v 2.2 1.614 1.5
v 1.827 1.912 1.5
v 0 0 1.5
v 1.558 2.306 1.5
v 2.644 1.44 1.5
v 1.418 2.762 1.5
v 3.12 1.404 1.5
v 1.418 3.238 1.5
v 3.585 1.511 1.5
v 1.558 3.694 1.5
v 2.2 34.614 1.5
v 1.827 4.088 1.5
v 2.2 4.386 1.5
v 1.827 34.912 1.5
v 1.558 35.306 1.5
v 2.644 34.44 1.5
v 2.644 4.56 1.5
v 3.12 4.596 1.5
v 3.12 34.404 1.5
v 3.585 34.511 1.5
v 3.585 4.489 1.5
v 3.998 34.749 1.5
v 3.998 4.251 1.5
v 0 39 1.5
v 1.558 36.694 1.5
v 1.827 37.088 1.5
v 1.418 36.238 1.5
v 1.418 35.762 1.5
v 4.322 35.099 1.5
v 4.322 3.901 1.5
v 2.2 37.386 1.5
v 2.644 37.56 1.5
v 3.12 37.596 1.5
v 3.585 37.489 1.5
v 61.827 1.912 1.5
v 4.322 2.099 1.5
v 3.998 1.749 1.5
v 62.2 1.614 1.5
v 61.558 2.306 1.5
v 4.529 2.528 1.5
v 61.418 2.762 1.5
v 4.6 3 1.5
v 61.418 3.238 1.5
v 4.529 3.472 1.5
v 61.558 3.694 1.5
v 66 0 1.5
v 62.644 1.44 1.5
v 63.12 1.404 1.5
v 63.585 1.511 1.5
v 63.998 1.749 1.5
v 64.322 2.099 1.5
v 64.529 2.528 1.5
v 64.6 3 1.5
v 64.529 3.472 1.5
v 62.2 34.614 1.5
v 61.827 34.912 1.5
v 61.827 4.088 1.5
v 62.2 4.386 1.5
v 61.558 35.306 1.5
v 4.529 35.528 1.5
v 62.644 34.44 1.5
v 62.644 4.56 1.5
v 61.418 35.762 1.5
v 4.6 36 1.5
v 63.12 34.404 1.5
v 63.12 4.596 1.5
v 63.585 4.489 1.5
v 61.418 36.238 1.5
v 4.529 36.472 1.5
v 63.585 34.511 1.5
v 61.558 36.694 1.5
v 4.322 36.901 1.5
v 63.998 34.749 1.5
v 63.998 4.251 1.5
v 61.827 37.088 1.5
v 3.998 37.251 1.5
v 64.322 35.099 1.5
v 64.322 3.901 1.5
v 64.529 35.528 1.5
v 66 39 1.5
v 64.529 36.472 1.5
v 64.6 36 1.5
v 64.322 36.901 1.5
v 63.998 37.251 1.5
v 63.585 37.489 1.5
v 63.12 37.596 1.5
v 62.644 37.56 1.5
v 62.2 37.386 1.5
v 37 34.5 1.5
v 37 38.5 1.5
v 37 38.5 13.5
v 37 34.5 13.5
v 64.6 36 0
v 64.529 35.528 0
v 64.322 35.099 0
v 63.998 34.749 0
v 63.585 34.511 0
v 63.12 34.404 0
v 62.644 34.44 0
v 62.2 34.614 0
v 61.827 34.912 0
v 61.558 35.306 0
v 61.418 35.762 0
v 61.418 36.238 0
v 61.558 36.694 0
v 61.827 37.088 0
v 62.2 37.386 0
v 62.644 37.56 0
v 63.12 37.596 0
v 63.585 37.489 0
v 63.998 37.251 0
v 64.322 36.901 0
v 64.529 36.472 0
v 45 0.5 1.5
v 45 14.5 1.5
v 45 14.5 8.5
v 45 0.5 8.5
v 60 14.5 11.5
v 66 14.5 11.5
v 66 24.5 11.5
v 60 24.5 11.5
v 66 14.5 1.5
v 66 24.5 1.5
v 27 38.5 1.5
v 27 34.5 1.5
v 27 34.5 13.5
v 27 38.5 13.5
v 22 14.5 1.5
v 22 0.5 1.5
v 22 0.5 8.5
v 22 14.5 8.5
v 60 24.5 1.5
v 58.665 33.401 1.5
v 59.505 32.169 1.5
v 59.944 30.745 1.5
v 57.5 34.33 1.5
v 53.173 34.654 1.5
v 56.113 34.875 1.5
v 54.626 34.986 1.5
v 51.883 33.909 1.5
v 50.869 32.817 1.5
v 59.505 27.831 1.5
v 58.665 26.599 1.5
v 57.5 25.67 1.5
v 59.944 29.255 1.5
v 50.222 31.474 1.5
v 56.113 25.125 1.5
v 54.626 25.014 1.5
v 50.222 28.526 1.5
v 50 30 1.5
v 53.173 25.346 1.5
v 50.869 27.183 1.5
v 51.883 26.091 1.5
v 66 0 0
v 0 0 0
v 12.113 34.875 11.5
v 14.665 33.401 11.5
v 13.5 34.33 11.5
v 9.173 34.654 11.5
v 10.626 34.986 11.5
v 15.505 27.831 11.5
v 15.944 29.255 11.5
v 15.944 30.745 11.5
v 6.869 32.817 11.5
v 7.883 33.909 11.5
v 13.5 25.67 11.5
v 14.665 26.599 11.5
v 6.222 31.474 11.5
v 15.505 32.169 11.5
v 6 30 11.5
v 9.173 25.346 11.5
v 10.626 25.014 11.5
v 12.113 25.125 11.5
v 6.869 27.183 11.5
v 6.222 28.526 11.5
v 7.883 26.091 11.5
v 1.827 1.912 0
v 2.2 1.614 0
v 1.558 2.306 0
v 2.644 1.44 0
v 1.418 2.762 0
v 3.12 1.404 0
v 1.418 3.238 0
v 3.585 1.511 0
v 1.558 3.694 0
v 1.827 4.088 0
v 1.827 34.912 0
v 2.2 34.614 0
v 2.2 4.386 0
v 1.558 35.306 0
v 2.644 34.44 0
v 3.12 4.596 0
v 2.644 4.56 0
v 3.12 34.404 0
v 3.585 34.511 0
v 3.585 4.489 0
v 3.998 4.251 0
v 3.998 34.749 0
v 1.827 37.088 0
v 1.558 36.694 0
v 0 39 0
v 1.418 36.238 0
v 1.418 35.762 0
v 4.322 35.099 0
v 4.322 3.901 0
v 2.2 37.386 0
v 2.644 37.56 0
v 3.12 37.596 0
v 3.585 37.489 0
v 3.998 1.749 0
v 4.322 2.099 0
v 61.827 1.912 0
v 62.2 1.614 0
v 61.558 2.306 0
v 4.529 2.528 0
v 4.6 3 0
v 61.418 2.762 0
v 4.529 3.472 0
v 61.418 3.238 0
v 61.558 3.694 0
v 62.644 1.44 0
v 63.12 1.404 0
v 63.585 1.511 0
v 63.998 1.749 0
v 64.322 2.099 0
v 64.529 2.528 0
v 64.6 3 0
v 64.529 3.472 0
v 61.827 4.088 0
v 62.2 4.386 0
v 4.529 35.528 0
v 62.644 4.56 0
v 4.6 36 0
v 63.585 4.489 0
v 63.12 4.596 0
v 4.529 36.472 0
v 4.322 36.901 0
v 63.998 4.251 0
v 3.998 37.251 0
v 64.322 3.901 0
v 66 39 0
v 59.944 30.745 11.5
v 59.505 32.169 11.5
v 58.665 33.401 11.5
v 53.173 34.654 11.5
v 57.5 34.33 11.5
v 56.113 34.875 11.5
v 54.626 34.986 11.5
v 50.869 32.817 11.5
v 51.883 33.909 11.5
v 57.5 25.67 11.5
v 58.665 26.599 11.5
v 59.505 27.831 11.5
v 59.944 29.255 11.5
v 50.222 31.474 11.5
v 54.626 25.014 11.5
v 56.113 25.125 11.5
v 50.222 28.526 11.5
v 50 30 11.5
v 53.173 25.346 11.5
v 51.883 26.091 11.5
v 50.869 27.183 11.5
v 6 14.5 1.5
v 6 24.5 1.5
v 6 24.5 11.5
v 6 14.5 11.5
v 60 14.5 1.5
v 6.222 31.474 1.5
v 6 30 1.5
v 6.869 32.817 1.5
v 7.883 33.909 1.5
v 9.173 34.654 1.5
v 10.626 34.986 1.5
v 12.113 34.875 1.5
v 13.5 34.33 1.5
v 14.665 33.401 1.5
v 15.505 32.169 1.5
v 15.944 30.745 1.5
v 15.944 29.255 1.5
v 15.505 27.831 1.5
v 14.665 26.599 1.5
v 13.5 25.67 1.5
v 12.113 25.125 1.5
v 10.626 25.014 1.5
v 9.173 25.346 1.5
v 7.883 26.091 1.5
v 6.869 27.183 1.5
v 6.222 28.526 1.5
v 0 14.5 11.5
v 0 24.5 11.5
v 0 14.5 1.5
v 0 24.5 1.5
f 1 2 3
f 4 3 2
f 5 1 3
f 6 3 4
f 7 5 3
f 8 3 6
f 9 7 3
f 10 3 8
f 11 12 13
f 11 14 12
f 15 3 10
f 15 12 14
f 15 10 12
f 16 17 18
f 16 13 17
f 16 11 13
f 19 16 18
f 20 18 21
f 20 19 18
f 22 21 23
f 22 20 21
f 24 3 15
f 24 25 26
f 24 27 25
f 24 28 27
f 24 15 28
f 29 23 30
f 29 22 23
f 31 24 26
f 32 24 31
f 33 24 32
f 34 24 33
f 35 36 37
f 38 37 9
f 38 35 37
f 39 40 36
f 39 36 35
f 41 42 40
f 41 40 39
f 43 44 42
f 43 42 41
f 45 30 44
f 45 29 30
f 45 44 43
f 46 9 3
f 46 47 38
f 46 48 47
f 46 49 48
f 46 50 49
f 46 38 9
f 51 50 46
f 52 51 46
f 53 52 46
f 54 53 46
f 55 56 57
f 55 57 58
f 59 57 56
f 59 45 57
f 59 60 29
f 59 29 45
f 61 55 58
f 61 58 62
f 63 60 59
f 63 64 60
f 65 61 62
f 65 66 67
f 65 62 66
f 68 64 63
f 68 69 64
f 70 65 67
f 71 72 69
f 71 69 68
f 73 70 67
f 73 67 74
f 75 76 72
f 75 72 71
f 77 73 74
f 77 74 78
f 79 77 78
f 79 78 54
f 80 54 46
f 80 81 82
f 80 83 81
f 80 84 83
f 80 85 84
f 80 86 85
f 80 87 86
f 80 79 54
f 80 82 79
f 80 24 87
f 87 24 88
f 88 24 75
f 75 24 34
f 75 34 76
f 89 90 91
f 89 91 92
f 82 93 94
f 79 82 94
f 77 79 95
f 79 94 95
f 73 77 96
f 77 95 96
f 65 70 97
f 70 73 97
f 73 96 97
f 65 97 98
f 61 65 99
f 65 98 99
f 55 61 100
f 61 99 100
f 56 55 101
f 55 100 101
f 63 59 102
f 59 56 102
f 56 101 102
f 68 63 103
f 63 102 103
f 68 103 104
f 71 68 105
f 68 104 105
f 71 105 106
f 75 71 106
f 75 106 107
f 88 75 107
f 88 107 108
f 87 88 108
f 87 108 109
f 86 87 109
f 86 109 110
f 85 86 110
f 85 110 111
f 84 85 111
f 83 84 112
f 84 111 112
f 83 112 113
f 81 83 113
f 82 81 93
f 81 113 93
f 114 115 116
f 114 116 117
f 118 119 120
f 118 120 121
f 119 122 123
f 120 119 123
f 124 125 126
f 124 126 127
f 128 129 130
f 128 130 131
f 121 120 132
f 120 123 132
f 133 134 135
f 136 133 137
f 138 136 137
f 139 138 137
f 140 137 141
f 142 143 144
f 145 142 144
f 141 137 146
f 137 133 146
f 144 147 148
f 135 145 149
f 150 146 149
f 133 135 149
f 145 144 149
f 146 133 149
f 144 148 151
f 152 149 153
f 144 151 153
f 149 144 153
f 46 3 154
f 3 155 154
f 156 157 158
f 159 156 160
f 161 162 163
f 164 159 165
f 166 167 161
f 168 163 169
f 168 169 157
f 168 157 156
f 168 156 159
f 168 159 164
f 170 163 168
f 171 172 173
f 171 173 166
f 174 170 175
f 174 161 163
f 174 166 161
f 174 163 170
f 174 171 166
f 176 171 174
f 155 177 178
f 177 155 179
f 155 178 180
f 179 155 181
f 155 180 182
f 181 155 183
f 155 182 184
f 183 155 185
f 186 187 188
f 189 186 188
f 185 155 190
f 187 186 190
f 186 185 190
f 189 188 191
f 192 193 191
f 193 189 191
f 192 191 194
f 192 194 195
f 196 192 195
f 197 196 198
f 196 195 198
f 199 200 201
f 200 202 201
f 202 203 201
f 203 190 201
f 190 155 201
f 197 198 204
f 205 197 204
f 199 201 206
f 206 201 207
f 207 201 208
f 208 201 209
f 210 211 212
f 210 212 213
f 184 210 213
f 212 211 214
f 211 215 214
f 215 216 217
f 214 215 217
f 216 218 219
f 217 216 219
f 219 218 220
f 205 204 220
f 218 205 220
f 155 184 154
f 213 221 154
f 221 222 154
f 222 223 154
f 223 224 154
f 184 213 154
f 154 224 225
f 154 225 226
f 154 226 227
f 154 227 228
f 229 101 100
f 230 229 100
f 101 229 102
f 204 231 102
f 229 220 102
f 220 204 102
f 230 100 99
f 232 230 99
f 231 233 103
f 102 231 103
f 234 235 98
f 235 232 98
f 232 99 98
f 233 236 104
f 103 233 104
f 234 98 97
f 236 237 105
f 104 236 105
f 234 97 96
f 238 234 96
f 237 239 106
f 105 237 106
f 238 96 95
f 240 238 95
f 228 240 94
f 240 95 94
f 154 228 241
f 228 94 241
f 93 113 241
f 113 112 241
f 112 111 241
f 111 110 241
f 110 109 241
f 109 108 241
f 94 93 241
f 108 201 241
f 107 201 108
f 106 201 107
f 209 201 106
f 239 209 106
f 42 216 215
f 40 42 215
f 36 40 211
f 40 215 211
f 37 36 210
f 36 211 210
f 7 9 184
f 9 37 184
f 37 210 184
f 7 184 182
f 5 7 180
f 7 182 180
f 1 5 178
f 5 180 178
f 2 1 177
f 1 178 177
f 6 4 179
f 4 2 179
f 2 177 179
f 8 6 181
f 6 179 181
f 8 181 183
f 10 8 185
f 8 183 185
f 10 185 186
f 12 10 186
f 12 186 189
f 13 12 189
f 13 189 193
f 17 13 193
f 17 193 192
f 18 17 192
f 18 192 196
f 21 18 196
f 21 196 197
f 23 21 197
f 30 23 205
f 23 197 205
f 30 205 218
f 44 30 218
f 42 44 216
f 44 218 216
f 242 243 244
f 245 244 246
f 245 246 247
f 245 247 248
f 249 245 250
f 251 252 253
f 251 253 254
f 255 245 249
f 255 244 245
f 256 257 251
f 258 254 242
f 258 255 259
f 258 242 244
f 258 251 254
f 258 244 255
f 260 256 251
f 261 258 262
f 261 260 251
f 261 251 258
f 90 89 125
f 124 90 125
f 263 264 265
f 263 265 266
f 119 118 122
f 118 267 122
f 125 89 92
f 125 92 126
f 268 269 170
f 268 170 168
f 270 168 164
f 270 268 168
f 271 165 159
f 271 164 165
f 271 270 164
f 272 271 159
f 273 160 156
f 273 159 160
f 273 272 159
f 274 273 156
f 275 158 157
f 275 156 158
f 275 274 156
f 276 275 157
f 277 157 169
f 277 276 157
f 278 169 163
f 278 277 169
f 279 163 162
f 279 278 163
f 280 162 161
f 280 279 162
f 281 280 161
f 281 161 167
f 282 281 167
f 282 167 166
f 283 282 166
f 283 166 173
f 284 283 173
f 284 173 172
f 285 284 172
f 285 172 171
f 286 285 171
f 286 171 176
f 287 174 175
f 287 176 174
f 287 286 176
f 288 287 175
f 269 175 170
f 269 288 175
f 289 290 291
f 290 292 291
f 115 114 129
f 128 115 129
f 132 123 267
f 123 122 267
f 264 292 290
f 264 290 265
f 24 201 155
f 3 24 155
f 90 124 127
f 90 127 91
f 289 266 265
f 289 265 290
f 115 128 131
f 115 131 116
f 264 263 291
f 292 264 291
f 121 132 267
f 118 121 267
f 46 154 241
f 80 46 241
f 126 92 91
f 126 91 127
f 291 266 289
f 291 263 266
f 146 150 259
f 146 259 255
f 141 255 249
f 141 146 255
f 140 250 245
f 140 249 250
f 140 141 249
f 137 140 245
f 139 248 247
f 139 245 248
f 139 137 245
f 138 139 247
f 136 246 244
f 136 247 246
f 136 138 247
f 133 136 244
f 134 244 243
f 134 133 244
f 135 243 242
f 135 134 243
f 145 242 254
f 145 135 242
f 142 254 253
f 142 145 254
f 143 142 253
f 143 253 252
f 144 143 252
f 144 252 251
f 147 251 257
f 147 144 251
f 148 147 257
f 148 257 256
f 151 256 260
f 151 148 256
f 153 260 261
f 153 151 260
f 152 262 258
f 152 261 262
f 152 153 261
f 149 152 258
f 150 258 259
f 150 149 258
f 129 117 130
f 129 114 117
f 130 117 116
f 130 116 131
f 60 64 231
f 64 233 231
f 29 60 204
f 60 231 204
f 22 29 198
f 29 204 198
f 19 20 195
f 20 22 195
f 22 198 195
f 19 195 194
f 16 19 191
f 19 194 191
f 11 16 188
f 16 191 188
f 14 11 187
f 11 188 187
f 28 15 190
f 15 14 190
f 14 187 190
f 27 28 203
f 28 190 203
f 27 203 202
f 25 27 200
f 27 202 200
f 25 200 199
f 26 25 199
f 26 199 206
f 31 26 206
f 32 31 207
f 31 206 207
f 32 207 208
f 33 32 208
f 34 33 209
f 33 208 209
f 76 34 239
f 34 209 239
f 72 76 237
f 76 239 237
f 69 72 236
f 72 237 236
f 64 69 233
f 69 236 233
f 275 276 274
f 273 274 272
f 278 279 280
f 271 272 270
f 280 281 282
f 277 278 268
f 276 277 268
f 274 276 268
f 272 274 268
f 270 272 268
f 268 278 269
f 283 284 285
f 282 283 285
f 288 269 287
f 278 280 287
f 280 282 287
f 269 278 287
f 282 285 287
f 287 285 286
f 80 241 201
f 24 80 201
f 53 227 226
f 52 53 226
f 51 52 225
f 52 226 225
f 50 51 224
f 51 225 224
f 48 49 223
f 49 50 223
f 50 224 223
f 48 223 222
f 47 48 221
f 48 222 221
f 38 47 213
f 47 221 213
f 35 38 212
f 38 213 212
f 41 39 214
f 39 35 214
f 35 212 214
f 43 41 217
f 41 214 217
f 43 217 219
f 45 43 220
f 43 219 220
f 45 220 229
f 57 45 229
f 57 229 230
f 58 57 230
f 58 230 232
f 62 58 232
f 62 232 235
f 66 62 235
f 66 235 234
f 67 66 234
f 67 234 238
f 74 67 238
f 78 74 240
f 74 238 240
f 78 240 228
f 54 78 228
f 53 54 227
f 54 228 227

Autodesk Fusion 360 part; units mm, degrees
sketch "草图1" plane through (0, 0, 0) normal (0, 0, 1) x (1, 0, 0)
  line L0 (0, 0) -> (66, 0)
  line L1 (66, 0) -> (66, 39)
  line L2 (66, 39) -> (0, 39)
  line L3 (0, 39) -> (0, 0)
  line L4 (-18.8664, 19.5) -> (92.9344, 19.5)
  line L5 (33, 51.4326) -> (33, -27.2938)
  circle A0 centre (3, 36) radius 1.6
  circle A1 centre (63, 36) radius 1.6
  circle A2 centre (3, 3) radius 1.6
  circle A3 centre (63, 3) radius 1.6
  dimension "d1" = 66
  dimension "d2" = 39
  dimension "d3" = 3.2
  dimension "d4" = 60
  dimension "d5" = 33
extrude "拉伸1" add sketch "草图1" along normal blind 1.5 makes body 1
sketch "草图2" plane through (0, 0, 1.5) normal (0, 0, 1) x (-1, 0, 0)
  circle A0 centre (-3, -36) radius 1.6
  circle A1 centre (-63, -3) radius 1.6
  circle A2 centre (-3, -3) radius 1.6
  circle A3 centre (-63, -36) radius 1.6
  line L0 (0, -39) -> (0, 0)
  line L1 (0, 0) -> (-66, 0)
  line L2 (-66, 0) -> (-66, -39)
  line L3 (-66, -39) -> (0, -39)
  line L4 (0, -24.5) -> (-6, -24.5)
  line L5 (-6, -24.5) -> (-6, -14.5)
  line L6 (-6, -14.5) -> (0, -14.5)
  line L7 (0, -14.5) -> (0, -24.5)
  line L8 (-66, -24.5) -> (-60, -24.5)
  line L9 (-60, -24.5) -> (-60, -14.5)
  line L10 (-60, -14.5) -> (-66, -14.5)
  line L11 (-66, -14.5) -> (-66, -24.5)
  dimension "d8" = 10
  dimension "d9" = 10
  dimension "d10" = 6
  dimension "d11" = 6
  dimension "d12" = 14.5
  dimension "d13" = 14.5
extrude "拉伸2" add sketch "草图2" along normal blind 10 separate body contours L0 L4 L5 L6 L7 | L2 L8 L9 L10 L11 makes body 2 at (6, 21.1667, 4.8333) makes body 3 at (66, 17.8333, 4.8333)
sketch "草图3" plane through (0, 0, 1.5) normal (0, 0, 1) x (-1, 0, 0)
  circle A0 centre (-3, -36) radius 1.6
  circle A1 centre (-63, -3) radius 1.6
  circle A2 centre (-3, -3) radius 1.6
  circle A3 centre (-63, -36) radius 1.6
  line L0 (0, -39) -> (0, 0)
  line L1 (0, 0) -> (-66, 0)
  line L2 (-66, 0) -> (-66, -39)
  line L3 (-66, -39) -> (0, -39)
  circle A4 centre (-11, -30) radius 5
  circle A5 centre (-55, -30) radius 5
  dimension "d16" = 10
  dimension "d17" = 10
  dimension "d18" = 11
  dimension "d19" = 11
  dimension "d20" = 9
  dimension "d21" = 9
extrude "拉伸3" add sketch "草图3" along normal blind 10 separate body contours A4 | A5 makes body 4 at (50.0062, 30.2492, 8.1667) makes body 5 at (6.0062, 30.2492, 8.1667)
sketch "草图4" plane through (0, 0, 1.5) normal (0, 0, 1) x (-1, 0, 0)
  circle A0 centre (-3, -36) radius 1.6
  circle A1 centre (-63, -3) radius 1.6
  circle A2 centre (-3, -3) radius 1.6
  circle A3 centre (-63, -36) radius 1.6
  line L0 (0, -39) -> (0, 0)
  line L1 (0, 0) -> (-66, 0)
  line L2 (-66, 0) -> (-66, -39)
  line L3 (-66, -39) -> (0, -39)
  line L4 (-27, -38.5) -> (-37, -38.5)
  line L5 (-37, -38.5) -> (-37, -34.5)
  line L6 (-37, -34.5) -> (-27, -34.5)
  line L7 (-27, -34.5) -> (-27, -38.5)
  dimension "d24" = 10
  dimension "d25" = 4
  dimension "d26" = 27
  dimension "d27" = 0.5
extrude "拉伸4" add sketch "草图4" along normal blind 12 separate body contours L4 L5 L6 L7 makes body 6
sketch "草图5" plane through (0, 0, 1.5) normal (0, 0, 1) x (-1, 0, 0)
  circle A0 centre (-3, -36) radius 1.6
  circle A1 centre (-63, -3) radius 1.6
  circle A2 centre (-3, -3) radius 1.6
  circle A3 centre (-63, -36) radius 1.6
  line L0 (0, -39) -> (0, 0)
  line L1 (0, 0) -> (-66, 0)
  line L2 (-66, 0) -> (-66, -39)
  line L3 (-66, -39) -> (0, -39)
  line L4 (-22, -14.5) -> (-45, -14.5)
  line L5 (-45, -14.5) -> (-45, -0.5)
  line L6 (-45, -0.5) -> (-22, -0.5)
  line L7 (-22, -0.5) -> (-22, -14.5)
  dimension "d30" = 23
  dimension "d31" = 14
  dimension "d32" = 21
  dimension "d33" = 0.5
extrude "拉伸5" add sketch "草图5" along normal blind 7 separate body contours L4 L5 L6 L7 makes body 7
copy_body "实体->零部件1" bodies 1 removing the originals makes body 8 in component "Component'"
copy_body "实体->零部件2" bodies 2 removing the originals makes body 9 in component "Component''"
copy_body "实体->零部件3" bodies 3 removing the originals makes body 10 in component "Component'''"
copy_body "实体->零部件4" bodies 4 removing the originals makes body 11 in component "Component''''"
copy_body "实体->零部件5" bodies 5 removing the originals makes body 12 in component "Component'''''"
copy_body "实体->零部件6" bodies 6 removing the originals makes body 13 in component "Component''''''"
copy_body "实体->零部件7" bodies 7 removing the originals makes body 14 in component "Component'''''''"
component "Component'" placed x (1, 0, 0) y (0, 1, 0) z (0, 0, 1) at (0, 0, 0)
component "Component''" placed x (1, 0, 0) y (0, 1, 0) z (0, 0, 1) at (0, 0, 0)
component "Component'''" placed x (1, 0, 0) y (0, 1, 0) z (0, 0, 1) at (0, 0, 0)
component "Component''''" placed x (1, 0, 0) y (0, 1, 0) z (0, 0, 1) at (0, 0, 0)
component "Component'''''" placed x (1, 0, 0) y (0, 1, 0) z (0, 0, 1) at (0, 0, 0)
component "Component''''''" placed x (1, 0, 0) y (0, 1, 0) z (0, 0, 1) at (0, 0, 0)
component "Component'''''''" placed x (1, 0, 0) y (0, 1, 0) z (0, 0, 1) at (0, 0, 0)
